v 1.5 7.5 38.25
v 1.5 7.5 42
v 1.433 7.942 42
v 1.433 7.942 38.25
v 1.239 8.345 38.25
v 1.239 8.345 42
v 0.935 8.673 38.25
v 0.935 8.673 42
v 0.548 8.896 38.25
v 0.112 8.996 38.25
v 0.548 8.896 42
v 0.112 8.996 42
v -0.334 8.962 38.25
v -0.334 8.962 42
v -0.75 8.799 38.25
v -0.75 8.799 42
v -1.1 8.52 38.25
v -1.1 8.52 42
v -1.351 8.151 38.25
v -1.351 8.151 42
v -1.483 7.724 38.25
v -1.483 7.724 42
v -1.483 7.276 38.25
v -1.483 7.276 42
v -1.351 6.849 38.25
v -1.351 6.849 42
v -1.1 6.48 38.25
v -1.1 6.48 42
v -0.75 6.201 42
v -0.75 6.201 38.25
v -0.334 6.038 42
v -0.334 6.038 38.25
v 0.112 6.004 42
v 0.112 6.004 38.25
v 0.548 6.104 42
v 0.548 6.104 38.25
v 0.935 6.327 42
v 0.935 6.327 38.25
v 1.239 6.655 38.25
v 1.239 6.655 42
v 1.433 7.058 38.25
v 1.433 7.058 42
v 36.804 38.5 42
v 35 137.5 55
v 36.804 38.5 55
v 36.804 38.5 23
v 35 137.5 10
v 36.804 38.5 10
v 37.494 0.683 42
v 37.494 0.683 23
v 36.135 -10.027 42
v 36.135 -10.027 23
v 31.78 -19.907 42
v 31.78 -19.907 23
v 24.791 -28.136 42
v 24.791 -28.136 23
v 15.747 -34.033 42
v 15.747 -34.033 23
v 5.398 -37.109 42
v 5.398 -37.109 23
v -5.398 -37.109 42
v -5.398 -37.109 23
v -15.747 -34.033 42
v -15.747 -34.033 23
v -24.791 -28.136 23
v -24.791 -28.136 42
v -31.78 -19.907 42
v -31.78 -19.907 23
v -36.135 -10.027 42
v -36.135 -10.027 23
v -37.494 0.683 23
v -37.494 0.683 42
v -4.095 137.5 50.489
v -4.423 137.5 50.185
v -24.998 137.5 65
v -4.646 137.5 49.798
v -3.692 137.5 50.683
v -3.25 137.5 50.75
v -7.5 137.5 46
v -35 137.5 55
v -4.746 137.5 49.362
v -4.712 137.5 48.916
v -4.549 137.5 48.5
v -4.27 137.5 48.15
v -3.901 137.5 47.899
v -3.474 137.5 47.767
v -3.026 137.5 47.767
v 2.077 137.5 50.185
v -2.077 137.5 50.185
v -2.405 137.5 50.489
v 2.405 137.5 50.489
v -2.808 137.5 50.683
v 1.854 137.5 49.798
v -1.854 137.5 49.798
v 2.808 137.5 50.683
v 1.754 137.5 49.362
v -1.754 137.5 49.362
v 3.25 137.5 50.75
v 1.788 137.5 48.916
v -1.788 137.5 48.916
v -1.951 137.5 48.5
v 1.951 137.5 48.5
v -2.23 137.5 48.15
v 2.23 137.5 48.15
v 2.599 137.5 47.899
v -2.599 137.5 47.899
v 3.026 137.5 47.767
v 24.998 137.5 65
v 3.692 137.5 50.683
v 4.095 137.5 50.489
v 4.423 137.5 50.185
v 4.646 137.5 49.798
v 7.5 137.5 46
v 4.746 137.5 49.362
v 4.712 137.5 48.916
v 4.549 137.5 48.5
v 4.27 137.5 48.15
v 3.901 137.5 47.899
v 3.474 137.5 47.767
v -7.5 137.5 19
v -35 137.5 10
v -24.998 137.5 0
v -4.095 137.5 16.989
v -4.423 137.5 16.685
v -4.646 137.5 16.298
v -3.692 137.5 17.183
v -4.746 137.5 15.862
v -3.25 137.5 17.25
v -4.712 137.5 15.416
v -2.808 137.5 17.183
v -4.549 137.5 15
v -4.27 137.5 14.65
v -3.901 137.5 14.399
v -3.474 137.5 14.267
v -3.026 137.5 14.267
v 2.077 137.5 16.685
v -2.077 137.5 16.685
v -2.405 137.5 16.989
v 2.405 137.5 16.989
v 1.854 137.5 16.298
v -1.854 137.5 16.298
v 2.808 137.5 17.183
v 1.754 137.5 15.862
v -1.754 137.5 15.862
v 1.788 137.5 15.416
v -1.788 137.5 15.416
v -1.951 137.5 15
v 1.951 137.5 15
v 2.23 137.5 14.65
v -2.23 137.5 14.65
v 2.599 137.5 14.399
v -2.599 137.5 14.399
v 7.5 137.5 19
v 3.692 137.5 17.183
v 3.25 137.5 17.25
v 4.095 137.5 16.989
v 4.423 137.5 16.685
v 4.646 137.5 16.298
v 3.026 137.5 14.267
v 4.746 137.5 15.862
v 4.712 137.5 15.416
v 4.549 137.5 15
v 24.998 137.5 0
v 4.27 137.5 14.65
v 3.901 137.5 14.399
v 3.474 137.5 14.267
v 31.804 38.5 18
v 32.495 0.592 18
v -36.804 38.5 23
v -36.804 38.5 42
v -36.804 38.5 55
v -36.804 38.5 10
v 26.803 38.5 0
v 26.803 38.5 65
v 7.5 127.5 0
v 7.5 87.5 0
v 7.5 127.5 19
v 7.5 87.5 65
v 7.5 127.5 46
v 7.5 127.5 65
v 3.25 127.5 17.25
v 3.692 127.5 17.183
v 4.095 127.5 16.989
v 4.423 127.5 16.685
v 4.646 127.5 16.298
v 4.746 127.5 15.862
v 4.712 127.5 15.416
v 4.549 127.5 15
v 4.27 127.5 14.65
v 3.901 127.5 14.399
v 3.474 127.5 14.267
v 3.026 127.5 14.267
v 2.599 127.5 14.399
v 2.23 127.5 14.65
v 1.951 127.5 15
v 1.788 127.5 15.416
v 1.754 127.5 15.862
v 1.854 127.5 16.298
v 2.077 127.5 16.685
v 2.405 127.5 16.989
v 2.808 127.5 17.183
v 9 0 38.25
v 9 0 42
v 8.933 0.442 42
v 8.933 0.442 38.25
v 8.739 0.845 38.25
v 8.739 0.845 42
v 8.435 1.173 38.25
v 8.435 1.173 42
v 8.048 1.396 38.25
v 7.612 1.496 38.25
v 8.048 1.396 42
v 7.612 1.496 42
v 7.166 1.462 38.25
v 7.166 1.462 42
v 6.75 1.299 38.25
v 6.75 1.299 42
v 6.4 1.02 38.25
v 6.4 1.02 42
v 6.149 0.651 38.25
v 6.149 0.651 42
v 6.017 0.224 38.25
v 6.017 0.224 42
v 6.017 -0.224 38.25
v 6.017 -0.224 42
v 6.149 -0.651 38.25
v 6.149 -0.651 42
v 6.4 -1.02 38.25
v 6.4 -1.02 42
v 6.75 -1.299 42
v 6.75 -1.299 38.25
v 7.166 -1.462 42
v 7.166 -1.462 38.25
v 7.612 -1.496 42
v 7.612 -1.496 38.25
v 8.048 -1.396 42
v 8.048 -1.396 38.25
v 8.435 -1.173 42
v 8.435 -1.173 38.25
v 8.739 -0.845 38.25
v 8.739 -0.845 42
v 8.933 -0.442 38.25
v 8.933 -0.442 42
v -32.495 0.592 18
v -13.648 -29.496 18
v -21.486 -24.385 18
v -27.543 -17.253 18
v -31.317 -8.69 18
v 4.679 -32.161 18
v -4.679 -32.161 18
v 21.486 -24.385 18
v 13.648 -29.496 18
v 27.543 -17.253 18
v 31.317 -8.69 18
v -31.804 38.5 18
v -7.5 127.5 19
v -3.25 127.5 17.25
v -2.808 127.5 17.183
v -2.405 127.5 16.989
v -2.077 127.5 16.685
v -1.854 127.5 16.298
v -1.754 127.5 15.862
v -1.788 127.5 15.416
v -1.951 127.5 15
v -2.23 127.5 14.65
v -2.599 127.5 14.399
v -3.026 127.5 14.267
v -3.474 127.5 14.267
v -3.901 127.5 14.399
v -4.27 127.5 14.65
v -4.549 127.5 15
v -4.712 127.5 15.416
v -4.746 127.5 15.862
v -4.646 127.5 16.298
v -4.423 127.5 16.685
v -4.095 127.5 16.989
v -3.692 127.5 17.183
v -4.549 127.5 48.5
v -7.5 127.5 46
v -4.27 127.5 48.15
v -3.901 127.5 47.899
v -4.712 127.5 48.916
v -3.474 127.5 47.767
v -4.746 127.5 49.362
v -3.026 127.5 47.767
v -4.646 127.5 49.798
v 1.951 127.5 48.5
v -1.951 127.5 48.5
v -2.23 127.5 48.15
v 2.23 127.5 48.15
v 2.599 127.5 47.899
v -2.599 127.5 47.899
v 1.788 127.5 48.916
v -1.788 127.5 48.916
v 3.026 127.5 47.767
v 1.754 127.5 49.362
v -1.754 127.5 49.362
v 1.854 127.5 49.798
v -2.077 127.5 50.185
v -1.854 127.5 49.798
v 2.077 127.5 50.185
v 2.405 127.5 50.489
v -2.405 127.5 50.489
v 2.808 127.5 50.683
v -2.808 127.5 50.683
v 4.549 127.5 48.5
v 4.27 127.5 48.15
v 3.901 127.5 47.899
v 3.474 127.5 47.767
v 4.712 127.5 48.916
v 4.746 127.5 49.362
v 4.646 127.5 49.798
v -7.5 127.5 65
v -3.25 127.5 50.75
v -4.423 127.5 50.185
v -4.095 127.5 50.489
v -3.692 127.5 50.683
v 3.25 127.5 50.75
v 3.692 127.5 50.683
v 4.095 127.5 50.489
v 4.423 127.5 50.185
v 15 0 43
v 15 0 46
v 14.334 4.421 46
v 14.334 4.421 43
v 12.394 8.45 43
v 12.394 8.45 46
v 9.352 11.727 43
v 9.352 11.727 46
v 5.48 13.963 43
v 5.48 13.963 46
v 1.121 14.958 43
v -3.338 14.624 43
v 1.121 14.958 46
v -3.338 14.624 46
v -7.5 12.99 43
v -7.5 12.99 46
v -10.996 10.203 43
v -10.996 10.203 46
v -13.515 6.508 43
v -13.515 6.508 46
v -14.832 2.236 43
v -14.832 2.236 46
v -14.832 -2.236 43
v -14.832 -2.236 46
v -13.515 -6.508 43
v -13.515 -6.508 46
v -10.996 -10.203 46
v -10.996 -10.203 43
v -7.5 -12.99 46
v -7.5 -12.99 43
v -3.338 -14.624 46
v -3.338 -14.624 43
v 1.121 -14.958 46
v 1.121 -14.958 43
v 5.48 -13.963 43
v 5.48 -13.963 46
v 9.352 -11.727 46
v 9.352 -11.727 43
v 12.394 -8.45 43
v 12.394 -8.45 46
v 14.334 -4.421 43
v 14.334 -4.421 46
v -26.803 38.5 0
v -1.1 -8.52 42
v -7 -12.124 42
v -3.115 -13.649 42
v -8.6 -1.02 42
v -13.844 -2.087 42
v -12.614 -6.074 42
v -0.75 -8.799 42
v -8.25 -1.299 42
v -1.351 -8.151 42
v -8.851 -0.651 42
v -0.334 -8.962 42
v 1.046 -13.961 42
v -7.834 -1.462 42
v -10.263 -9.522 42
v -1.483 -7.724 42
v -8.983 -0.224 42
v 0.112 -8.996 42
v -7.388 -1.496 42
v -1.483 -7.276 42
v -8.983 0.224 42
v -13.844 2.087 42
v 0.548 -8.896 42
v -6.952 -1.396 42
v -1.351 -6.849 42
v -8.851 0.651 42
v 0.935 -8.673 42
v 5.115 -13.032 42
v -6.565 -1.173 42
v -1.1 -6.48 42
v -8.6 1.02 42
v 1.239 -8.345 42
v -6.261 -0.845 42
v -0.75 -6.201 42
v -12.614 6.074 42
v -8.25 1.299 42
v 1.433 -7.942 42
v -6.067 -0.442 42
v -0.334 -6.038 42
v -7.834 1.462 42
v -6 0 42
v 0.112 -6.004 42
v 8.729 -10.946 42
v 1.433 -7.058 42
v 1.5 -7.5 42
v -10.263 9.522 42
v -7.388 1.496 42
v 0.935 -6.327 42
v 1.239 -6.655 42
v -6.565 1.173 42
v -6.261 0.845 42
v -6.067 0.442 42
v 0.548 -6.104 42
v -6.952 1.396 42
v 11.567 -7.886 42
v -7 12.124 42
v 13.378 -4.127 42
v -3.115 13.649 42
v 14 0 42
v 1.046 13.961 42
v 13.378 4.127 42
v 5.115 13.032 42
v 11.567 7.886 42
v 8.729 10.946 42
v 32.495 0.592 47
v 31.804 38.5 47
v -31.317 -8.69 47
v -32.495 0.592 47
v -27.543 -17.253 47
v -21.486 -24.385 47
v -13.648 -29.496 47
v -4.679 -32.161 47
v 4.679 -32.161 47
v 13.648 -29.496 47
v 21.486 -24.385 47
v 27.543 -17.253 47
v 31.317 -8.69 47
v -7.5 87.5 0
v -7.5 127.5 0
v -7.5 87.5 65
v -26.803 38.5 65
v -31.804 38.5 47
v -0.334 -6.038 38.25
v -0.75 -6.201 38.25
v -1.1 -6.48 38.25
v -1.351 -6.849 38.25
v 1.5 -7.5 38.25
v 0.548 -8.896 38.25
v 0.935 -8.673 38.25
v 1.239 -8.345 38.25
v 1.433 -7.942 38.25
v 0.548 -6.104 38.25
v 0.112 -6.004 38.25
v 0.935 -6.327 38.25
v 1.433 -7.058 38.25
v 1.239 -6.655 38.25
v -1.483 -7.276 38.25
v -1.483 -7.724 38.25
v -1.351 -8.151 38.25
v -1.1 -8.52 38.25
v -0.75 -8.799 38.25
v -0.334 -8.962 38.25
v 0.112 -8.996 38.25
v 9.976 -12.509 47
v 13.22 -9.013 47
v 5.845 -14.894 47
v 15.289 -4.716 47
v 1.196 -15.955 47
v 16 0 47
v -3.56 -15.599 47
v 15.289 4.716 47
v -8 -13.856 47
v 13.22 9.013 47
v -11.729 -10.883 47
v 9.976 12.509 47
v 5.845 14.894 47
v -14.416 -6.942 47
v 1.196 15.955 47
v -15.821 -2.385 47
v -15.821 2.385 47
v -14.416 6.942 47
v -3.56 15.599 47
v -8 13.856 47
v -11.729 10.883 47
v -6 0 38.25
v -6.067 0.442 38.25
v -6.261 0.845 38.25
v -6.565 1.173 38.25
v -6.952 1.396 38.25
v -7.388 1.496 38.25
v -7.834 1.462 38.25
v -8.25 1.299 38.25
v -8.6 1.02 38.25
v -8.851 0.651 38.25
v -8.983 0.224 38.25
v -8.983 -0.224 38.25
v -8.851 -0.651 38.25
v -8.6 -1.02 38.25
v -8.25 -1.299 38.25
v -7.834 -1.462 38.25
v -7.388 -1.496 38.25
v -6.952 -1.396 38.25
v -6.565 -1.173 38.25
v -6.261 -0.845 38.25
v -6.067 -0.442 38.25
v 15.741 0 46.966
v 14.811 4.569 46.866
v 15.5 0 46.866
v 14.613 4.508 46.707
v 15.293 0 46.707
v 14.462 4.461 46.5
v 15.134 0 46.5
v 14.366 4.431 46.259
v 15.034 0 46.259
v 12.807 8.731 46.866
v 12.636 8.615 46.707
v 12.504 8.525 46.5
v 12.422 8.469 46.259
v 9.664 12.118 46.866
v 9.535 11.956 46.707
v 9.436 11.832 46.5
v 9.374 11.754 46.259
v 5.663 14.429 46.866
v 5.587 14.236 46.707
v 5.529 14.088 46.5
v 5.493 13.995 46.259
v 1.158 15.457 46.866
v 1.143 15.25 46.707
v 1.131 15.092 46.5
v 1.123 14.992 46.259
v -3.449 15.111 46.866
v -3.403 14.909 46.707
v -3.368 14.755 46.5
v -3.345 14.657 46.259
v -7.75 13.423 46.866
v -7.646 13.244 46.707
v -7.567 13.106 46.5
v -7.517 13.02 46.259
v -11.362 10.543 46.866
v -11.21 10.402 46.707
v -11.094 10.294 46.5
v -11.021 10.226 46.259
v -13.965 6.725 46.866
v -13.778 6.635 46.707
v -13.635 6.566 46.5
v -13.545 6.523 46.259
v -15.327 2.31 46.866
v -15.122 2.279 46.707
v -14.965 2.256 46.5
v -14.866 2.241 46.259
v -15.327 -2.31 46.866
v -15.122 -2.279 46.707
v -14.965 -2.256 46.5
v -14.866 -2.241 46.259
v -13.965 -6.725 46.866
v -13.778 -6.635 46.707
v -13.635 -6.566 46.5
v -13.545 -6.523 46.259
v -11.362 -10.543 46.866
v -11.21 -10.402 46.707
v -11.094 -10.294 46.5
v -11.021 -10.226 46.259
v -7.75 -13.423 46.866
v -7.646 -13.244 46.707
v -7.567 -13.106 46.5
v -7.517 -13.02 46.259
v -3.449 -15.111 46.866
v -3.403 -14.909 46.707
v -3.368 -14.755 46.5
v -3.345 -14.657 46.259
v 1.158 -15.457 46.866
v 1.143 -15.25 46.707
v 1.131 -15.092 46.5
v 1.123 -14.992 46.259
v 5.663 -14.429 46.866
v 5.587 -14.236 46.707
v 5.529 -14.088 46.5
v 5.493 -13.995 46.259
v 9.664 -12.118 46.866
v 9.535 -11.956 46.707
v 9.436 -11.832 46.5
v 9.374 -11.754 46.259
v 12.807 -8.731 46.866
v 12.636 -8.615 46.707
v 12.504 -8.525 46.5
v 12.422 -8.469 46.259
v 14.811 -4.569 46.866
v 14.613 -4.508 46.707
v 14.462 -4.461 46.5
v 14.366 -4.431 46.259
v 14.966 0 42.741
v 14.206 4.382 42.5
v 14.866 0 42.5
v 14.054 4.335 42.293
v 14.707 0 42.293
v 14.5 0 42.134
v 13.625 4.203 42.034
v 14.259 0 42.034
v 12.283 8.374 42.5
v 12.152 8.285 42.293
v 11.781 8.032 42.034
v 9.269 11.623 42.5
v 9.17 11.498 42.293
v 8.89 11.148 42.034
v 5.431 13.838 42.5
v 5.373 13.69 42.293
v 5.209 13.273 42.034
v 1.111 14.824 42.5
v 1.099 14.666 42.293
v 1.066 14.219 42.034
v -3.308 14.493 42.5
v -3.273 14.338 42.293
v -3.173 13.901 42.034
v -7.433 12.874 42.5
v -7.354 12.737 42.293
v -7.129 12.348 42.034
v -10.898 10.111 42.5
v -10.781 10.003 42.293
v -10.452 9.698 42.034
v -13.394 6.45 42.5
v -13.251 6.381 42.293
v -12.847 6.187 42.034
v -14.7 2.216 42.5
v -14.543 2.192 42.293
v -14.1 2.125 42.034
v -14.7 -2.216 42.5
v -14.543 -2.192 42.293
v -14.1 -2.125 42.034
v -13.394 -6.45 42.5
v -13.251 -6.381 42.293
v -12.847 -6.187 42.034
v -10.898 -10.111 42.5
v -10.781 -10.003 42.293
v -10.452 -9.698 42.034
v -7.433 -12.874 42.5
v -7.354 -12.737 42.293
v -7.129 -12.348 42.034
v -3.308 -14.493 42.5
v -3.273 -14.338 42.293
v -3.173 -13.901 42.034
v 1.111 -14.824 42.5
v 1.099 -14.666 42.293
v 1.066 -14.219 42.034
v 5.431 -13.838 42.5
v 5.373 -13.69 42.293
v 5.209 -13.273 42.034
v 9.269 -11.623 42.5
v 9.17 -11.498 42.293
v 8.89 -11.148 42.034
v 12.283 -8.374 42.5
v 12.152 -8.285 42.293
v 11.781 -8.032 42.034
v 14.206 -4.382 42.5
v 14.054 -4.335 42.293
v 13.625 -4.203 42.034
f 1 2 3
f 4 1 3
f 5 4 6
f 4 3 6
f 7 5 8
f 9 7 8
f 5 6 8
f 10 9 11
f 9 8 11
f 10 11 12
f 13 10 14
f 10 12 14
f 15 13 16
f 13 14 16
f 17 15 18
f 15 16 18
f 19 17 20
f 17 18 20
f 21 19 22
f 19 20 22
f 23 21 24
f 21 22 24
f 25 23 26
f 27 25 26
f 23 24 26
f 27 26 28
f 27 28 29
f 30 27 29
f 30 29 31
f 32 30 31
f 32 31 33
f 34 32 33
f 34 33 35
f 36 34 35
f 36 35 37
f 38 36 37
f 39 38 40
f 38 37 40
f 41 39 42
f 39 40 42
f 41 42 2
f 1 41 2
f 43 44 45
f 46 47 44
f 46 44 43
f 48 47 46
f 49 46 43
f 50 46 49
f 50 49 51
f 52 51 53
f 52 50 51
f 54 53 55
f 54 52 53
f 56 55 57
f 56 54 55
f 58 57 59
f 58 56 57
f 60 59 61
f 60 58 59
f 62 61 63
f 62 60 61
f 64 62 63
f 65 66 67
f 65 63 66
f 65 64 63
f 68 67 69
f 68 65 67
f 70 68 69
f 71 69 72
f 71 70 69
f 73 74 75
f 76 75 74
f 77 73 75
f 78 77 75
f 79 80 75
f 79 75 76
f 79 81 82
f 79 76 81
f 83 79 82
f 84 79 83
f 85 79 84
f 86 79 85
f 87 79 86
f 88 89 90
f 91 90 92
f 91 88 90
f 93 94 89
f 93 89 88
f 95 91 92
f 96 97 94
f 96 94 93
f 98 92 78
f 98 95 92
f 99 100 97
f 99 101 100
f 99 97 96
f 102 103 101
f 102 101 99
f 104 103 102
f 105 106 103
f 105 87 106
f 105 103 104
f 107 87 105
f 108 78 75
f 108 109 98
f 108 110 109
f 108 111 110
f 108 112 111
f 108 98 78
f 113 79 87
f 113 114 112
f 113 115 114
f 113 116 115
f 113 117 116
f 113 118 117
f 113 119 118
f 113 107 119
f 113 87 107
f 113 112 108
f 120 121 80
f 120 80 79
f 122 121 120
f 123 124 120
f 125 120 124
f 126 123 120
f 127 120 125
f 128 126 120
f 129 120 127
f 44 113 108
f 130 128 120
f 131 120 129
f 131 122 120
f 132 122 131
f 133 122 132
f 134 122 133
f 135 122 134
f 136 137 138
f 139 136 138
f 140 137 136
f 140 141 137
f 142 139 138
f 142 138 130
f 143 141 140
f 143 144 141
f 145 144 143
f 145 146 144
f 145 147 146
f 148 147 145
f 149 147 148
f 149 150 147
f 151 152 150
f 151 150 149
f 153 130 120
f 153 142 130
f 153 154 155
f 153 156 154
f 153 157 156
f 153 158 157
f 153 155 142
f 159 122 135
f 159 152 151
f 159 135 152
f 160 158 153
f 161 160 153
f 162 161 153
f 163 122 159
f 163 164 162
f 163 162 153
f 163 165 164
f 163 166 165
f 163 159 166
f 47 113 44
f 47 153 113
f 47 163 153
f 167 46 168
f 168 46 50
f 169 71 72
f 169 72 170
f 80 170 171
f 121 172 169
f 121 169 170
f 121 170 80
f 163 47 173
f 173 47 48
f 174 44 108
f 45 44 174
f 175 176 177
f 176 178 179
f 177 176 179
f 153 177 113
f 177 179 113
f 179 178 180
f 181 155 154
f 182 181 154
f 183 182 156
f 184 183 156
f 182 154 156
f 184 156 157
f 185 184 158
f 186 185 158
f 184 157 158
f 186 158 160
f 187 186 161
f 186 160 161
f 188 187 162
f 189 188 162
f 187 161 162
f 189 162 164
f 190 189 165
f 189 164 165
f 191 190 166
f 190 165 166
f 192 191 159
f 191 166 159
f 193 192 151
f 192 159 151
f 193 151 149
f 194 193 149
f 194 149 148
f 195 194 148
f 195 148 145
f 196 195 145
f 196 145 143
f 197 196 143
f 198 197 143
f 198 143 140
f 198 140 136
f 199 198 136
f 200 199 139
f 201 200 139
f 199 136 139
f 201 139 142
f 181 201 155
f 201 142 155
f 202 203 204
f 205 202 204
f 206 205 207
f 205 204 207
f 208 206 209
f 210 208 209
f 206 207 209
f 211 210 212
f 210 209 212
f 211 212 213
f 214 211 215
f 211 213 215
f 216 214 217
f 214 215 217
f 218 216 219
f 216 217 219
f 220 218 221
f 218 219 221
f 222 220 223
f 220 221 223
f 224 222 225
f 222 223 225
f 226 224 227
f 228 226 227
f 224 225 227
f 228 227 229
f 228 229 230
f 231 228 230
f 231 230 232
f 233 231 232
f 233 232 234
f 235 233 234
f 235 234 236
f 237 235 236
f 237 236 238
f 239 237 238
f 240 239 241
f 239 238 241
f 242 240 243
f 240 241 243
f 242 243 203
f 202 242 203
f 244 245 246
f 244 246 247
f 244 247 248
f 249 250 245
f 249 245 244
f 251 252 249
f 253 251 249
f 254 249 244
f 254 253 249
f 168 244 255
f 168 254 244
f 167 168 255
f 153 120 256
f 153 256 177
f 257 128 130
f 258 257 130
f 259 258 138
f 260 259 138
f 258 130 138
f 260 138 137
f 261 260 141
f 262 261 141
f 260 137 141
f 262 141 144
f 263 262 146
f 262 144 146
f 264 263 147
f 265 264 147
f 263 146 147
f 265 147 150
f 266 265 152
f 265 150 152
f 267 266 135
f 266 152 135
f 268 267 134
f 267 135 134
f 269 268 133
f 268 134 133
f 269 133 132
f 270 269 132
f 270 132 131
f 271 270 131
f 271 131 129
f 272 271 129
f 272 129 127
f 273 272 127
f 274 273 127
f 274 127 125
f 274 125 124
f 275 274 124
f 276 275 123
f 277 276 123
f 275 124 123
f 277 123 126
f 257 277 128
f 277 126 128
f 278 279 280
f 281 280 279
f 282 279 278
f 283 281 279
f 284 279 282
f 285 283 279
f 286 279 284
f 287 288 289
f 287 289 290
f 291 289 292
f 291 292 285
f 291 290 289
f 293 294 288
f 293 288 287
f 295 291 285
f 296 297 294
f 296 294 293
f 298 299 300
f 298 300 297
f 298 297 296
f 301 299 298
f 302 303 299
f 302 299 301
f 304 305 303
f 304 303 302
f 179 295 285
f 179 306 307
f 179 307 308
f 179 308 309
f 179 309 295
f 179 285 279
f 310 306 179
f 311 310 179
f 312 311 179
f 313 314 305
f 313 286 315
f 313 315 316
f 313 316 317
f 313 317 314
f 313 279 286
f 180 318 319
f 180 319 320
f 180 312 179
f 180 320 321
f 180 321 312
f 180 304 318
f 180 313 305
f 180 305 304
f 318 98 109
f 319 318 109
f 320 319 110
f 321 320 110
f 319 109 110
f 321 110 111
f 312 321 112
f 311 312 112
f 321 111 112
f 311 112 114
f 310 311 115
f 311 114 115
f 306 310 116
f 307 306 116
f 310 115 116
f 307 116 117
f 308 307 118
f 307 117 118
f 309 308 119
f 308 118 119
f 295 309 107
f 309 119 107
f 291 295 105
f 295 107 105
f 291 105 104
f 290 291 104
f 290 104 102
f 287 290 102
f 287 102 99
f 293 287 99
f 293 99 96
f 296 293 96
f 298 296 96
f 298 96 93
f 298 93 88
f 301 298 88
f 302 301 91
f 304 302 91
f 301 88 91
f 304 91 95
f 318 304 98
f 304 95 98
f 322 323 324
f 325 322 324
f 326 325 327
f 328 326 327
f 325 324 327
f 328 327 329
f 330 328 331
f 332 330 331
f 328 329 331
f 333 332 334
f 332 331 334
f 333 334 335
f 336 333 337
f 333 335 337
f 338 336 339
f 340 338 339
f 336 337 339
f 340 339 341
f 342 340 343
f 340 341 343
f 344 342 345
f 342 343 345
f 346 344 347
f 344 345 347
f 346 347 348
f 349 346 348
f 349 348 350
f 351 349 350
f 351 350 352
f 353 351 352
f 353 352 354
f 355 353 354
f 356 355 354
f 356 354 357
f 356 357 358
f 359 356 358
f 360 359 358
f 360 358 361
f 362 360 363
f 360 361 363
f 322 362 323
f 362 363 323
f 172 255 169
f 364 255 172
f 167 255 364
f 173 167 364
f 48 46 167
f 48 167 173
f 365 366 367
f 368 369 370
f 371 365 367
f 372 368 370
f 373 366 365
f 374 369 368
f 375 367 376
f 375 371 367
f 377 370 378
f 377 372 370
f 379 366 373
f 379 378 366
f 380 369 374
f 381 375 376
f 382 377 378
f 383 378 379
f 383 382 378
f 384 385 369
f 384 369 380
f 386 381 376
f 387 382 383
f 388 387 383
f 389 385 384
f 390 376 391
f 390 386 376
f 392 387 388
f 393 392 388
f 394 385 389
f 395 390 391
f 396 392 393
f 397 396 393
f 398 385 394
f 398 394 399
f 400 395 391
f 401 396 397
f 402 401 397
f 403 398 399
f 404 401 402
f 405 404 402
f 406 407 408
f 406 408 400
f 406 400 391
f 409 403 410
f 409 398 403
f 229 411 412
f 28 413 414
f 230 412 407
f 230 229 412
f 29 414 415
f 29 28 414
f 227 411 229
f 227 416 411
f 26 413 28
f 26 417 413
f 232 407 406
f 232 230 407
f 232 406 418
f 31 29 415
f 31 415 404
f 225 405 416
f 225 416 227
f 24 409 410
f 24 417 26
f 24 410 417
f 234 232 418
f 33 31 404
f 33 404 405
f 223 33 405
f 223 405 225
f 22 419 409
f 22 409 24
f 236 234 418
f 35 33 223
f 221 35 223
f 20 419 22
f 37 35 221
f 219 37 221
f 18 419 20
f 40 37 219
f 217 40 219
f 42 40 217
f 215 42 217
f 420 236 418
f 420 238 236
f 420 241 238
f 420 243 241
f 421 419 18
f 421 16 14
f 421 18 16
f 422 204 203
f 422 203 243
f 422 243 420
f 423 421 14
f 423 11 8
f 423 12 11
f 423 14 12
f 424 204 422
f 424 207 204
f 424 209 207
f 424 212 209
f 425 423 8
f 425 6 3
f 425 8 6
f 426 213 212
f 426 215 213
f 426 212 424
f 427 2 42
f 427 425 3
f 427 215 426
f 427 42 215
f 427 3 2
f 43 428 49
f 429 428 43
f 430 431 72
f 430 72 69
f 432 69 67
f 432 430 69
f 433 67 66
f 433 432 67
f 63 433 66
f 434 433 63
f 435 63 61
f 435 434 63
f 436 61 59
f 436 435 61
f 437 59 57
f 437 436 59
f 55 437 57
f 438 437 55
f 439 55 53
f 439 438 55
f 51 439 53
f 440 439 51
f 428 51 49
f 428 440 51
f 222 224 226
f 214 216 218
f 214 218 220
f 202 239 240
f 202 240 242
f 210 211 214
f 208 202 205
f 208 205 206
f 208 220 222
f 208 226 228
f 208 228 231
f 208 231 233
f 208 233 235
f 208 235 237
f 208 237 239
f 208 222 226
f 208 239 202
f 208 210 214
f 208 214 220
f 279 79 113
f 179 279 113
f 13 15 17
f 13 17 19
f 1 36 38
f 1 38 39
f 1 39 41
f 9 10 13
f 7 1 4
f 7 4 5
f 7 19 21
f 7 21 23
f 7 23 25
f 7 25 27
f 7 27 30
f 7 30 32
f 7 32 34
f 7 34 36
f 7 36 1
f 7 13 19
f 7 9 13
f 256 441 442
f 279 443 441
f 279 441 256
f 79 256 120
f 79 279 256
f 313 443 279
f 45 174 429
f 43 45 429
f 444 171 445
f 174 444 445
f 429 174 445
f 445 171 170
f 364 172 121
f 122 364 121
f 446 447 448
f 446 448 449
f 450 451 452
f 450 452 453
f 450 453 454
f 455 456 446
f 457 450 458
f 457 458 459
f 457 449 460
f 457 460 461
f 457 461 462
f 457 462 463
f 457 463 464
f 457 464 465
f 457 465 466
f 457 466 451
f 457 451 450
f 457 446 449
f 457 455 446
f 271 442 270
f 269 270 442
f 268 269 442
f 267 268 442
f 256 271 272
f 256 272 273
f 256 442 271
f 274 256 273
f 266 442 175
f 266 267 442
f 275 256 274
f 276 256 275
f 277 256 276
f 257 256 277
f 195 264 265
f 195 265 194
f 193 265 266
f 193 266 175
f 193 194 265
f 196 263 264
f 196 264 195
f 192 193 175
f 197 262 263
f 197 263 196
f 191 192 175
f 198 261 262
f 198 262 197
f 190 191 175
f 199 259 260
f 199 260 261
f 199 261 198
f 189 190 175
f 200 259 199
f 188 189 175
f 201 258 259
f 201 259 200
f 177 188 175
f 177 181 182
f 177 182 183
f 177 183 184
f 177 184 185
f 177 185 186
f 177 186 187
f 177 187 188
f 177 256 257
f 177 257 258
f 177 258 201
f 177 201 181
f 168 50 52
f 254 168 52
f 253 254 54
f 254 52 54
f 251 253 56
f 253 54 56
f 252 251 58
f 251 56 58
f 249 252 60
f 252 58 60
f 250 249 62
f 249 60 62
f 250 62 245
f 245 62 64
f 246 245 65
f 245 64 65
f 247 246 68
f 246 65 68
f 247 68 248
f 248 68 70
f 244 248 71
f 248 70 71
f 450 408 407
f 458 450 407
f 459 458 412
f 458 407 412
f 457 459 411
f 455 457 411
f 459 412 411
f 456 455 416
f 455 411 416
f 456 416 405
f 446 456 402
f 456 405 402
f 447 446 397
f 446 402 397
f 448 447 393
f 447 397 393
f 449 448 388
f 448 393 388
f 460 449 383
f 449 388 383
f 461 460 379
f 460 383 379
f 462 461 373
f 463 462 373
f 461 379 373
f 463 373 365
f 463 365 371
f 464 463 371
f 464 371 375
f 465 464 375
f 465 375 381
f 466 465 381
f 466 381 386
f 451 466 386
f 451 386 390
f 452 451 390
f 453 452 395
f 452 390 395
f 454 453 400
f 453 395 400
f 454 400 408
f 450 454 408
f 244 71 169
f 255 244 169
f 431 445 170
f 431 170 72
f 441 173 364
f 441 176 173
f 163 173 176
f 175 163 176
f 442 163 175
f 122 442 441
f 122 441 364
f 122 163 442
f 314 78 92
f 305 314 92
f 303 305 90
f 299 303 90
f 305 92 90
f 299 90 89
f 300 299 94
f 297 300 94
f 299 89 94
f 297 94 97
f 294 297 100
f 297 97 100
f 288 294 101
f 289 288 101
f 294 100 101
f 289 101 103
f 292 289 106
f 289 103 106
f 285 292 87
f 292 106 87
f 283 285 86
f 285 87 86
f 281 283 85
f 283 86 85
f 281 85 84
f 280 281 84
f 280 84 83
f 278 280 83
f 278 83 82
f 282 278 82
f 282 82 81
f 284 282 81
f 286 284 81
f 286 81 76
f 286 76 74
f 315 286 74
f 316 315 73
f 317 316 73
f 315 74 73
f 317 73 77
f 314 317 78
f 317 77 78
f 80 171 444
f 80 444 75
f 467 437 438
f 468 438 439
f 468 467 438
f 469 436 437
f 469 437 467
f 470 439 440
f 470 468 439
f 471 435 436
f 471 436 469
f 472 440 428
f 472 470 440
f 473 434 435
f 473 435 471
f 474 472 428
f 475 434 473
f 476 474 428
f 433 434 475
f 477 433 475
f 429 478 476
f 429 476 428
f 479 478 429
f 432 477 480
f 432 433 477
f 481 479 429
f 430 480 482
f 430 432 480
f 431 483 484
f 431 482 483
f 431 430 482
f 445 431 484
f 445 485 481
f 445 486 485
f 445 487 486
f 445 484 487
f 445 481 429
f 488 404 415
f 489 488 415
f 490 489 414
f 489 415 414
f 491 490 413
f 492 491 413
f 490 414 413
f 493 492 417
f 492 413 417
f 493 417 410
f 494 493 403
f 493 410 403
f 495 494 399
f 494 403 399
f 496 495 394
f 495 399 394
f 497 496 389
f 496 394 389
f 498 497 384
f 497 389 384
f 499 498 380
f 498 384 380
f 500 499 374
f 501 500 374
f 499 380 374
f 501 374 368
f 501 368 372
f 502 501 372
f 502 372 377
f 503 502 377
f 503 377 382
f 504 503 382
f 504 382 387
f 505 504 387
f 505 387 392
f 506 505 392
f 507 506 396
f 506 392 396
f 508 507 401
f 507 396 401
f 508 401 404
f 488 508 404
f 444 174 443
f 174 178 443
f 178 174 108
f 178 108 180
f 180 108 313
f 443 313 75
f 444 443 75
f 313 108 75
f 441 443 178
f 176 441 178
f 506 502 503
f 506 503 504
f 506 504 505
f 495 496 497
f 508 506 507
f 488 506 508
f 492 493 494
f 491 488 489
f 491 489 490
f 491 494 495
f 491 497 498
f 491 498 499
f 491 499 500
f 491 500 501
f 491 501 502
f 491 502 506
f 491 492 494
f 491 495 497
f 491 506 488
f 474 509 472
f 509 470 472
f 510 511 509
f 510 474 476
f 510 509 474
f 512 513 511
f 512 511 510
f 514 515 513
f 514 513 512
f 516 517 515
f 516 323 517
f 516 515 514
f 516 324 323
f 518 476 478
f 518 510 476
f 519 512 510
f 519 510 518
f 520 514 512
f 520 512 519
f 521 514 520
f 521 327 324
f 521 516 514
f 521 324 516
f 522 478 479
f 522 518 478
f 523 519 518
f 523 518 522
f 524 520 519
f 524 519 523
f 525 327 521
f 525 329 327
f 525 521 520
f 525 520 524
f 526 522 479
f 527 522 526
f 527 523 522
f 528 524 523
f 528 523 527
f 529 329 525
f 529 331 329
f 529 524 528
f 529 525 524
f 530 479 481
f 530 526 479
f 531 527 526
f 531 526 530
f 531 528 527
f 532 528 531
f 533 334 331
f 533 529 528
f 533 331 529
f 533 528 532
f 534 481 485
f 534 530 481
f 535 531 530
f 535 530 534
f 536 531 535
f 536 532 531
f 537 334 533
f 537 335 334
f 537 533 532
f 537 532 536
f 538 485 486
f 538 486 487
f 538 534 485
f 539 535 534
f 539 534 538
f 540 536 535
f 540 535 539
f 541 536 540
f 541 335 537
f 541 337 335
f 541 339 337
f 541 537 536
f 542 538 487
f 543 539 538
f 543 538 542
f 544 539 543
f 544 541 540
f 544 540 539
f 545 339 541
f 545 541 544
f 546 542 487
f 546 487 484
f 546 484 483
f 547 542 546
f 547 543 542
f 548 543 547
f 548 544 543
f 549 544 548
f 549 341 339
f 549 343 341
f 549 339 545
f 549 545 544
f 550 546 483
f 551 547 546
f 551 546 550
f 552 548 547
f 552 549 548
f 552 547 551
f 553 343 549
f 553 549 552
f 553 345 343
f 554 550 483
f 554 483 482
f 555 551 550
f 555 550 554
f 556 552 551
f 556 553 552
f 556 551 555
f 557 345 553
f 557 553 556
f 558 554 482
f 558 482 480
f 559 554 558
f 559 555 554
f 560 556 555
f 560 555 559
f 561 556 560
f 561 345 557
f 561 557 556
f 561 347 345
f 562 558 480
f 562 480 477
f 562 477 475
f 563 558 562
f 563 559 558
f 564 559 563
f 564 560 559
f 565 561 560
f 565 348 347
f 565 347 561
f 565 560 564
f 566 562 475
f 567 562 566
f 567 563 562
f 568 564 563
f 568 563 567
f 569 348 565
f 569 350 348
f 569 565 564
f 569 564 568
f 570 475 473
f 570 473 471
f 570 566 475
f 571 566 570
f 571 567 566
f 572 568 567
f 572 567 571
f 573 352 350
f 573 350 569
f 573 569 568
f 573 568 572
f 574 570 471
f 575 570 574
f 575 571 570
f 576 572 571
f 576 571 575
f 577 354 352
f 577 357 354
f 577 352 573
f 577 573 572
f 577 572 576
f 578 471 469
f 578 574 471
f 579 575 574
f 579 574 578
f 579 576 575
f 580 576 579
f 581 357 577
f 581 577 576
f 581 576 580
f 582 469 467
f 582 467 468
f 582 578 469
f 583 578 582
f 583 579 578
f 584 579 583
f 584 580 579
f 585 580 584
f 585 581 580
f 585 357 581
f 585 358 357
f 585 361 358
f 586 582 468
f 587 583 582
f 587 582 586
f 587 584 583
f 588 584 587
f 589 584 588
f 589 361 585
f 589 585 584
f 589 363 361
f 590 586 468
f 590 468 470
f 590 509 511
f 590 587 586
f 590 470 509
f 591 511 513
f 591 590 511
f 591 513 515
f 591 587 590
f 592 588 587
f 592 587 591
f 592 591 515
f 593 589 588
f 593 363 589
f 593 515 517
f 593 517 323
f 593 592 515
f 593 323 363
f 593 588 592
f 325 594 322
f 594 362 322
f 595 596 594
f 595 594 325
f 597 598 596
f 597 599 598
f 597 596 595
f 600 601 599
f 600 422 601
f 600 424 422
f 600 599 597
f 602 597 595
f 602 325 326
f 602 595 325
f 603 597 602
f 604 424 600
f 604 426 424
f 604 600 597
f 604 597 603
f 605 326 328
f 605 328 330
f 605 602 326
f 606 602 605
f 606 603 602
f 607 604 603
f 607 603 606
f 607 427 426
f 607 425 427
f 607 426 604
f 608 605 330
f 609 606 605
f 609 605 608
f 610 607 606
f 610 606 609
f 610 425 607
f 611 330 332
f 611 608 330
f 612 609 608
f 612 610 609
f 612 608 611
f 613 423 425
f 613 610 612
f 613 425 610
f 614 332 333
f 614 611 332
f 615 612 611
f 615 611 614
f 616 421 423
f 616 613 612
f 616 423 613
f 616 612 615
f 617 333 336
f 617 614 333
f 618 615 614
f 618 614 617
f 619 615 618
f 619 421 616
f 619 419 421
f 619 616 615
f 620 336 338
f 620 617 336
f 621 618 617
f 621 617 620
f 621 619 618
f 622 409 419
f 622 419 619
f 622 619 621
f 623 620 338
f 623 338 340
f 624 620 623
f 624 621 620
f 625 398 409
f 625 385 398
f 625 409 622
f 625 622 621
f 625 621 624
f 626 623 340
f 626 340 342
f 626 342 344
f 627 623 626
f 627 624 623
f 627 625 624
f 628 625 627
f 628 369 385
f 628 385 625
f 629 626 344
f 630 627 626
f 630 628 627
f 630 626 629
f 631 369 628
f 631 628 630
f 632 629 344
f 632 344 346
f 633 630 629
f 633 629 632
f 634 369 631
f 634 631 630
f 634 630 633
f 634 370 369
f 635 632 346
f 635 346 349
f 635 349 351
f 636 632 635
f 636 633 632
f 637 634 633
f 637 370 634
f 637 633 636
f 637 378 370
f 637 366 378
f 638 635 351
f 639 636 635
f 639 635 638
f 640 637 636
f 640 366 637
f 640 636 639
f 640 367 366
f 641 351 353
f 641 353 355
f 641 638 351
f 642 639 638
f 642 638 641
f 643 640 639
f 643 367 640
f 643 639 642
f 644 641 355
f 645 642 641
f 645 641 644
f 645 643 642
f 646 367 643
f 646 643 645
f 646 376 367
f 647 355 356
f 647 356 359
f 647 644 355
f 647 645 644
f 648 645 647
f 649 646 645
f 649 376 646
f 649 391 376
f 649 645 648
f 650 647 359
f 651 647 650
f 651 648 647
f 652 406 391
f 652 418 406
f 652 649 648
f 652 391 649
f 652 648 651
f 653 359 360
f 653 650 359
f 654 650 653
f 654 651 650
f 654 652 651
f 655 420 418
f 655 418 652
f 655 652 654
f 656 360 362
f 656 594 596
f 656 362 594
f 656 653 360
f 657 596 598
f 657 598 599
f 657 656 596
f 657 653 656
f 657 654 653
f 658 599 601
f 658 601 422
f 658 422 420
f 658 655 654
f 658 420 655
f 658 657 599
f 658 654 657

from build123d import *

# Parameters (mm, degrees)
BOSS_EXTRUDE1_DEPTH = 65
SKETCH2_W           = 18
SKETCH2_H           = 76
CUT_EXTRUDE1_DEPTH  = 48.5
CHAMFER1_SIZE       = 10
CHAMFER2_SIZE       = 5
SKETCH3_R           = 15
CUT_EXTRUDE2_DEPTH  = 5
SKETCH5_R           = 1.5
CUT_EXTRUDE3_DEPTH  = 3.75
FILLET1_R           = 1
SKETCH6_W           = 15
SKETCH6_H           = 40
CUT_EXTRUDE4_DEPTH  = 157.644501978
SKETCH7_R           = 1.5
SKETCH7_W           = 15
SKETCH7_H           = 27
CUT_EXTRUDE5_DEPTH  = 10


with BuildPart() as part:
    # Sketch1 → Boss-Extrude1 (new body)
    with BuildSketch(Plane.XY):
        with BuildLine():
            Line((-35, 137.5), (35, 137.5))
            Line((35, 137.5), (37.49377228, 0.68340342))
            ThreePointArc((37.49377228, 0.68340342), (0, -37.5), (-37.49377228, 0.68340342))
            Line((-37.49377228, 0.68340342), (-35, 137.5))
        make_face()
    extrude(amount=BOSS_EXTRUDE1_DEPTH)

    # Sketch2 → Cut-Extrude1 (cut, symmetric)
    with BuildSketch(Plane(origin=(0, 0, 0), x_dir=(0, 0, -1), z_dir=(1, 0, 0))):
        with Locations((-56, 0.5)):
            Rectangle(SKETCH2_W, SKETCH2_H)
        with Locations((-9, 0.5)):
            Rectangle(SKETCH2_W, SKETCH2_H)
    extrude(amount=CUT_EXTRUDE1_DEPTH, both=True, mode=Mode.SUBTRACT)

    # Chamfer1
    chamfer1_edges = [part.edges().sort_by_distance(p)[0] for p in [
        (-35.902242352, 88, 65),
        (35.902242352, 88, 0),
        (35.902242352, 88, 65),
        (-35.902242352, 88, 0),
    ]]
    chamfer(chamfer1_edges, length=CHAMFER1_SIZE)

    # Chamfer2
    chamfer2_edges = [part.edges().sort_by_distance(p)[0] for p in [
        (0, -37.5, 18),
        (0, -37.5, 47),
        (37.149128492, 19.59170171, 47),
        (-37.149128492, 19.59170171, 47),
        (37.149128492, 19.59170171, 18),
        (-37.149128492, 19.59170171, 18),
    ]]
    chamfer(chamfer2_edges, length=CHAMFER2_SIZE)

    # Sketch3 → Cut-Extrude2 (cut, symmetric)
    with BuildSketch(Plane.XY.offset(47)):
        Circle(SKETCH3_R)
    extrude(amount=CUT_EXTRUDE2_DEPTH, both=True, mode=Mode.SUBTRACT)

    # Sketch5 → Cut-Extrude3 (cut, symmetric)
    with BuildSketch(Plane.XY.offset(42)):
        with Locations((0, 7.5)):
            Circle(SKETCH5_R)
        with Locations((7.5, 0)):
            Circle(SKETCH5_R)
        with Locations((0, -7.5)):
            Circle(SKETCH5_R)
        with Locations((-7.5, 0)):
            Circle(SKETCH5_R)
    extrude(amount=CUT_EXTRUDE3_DEPTH, both=True, mode=Mode.SUBTRACT)

    # Fillet1
    fillet1_edges = [part.edges().sort_by_distance(p)[0] for p in [
        (-15, 0, 47),
        (-15, 0, 42),
    ]]
    fillet(fillet1_edges, radius=FILLET1_R)

    # Sketch6 → Cut-Extrude4 (cut, through all)
    with BuildSketch(Plane.XY.offset(65)):
        with Locations((0, 107.5)):
            Rectangle(SKETCH6_W, SKETCH6_H)
    extrude(amount=-CUT_EXTRUDE4_DEPTH, mode=Mode.SUBTRACT)

    # Sketch7 → Cut-Extrude5 (cut)
    with BuildSketch(Plane(origin=(0, 137.5, 0), x_dir=(1, 0, 0), z_dir=(0, 1, 0))):
        with Locations(Location((-3.25, -15.75, 0), (0, 0, 270))):
            Circle(SKETCH7_R)
        with Locations(Location((3.25, -15.75, 0), (0, 0, 270))):
            Circle(SKETCH7_R)
        with Locations(Location((3.25, -49.25, 0), (0, 0, 270))):
            Circle(SKETCH7_R)
        with Locations(Location((-3.25, -49.25, 0), (0, 0, 270))):
            Circle(SKETCH7_R)
        with Locations((0, -32.5)):
            Rectangle(SKETCH7_W, SKETCH7_H)
    extrude(amount=-CUT_EXTRUDE5_DEPTH, mode=Mode.SUBTRACT)


solid = part.part
